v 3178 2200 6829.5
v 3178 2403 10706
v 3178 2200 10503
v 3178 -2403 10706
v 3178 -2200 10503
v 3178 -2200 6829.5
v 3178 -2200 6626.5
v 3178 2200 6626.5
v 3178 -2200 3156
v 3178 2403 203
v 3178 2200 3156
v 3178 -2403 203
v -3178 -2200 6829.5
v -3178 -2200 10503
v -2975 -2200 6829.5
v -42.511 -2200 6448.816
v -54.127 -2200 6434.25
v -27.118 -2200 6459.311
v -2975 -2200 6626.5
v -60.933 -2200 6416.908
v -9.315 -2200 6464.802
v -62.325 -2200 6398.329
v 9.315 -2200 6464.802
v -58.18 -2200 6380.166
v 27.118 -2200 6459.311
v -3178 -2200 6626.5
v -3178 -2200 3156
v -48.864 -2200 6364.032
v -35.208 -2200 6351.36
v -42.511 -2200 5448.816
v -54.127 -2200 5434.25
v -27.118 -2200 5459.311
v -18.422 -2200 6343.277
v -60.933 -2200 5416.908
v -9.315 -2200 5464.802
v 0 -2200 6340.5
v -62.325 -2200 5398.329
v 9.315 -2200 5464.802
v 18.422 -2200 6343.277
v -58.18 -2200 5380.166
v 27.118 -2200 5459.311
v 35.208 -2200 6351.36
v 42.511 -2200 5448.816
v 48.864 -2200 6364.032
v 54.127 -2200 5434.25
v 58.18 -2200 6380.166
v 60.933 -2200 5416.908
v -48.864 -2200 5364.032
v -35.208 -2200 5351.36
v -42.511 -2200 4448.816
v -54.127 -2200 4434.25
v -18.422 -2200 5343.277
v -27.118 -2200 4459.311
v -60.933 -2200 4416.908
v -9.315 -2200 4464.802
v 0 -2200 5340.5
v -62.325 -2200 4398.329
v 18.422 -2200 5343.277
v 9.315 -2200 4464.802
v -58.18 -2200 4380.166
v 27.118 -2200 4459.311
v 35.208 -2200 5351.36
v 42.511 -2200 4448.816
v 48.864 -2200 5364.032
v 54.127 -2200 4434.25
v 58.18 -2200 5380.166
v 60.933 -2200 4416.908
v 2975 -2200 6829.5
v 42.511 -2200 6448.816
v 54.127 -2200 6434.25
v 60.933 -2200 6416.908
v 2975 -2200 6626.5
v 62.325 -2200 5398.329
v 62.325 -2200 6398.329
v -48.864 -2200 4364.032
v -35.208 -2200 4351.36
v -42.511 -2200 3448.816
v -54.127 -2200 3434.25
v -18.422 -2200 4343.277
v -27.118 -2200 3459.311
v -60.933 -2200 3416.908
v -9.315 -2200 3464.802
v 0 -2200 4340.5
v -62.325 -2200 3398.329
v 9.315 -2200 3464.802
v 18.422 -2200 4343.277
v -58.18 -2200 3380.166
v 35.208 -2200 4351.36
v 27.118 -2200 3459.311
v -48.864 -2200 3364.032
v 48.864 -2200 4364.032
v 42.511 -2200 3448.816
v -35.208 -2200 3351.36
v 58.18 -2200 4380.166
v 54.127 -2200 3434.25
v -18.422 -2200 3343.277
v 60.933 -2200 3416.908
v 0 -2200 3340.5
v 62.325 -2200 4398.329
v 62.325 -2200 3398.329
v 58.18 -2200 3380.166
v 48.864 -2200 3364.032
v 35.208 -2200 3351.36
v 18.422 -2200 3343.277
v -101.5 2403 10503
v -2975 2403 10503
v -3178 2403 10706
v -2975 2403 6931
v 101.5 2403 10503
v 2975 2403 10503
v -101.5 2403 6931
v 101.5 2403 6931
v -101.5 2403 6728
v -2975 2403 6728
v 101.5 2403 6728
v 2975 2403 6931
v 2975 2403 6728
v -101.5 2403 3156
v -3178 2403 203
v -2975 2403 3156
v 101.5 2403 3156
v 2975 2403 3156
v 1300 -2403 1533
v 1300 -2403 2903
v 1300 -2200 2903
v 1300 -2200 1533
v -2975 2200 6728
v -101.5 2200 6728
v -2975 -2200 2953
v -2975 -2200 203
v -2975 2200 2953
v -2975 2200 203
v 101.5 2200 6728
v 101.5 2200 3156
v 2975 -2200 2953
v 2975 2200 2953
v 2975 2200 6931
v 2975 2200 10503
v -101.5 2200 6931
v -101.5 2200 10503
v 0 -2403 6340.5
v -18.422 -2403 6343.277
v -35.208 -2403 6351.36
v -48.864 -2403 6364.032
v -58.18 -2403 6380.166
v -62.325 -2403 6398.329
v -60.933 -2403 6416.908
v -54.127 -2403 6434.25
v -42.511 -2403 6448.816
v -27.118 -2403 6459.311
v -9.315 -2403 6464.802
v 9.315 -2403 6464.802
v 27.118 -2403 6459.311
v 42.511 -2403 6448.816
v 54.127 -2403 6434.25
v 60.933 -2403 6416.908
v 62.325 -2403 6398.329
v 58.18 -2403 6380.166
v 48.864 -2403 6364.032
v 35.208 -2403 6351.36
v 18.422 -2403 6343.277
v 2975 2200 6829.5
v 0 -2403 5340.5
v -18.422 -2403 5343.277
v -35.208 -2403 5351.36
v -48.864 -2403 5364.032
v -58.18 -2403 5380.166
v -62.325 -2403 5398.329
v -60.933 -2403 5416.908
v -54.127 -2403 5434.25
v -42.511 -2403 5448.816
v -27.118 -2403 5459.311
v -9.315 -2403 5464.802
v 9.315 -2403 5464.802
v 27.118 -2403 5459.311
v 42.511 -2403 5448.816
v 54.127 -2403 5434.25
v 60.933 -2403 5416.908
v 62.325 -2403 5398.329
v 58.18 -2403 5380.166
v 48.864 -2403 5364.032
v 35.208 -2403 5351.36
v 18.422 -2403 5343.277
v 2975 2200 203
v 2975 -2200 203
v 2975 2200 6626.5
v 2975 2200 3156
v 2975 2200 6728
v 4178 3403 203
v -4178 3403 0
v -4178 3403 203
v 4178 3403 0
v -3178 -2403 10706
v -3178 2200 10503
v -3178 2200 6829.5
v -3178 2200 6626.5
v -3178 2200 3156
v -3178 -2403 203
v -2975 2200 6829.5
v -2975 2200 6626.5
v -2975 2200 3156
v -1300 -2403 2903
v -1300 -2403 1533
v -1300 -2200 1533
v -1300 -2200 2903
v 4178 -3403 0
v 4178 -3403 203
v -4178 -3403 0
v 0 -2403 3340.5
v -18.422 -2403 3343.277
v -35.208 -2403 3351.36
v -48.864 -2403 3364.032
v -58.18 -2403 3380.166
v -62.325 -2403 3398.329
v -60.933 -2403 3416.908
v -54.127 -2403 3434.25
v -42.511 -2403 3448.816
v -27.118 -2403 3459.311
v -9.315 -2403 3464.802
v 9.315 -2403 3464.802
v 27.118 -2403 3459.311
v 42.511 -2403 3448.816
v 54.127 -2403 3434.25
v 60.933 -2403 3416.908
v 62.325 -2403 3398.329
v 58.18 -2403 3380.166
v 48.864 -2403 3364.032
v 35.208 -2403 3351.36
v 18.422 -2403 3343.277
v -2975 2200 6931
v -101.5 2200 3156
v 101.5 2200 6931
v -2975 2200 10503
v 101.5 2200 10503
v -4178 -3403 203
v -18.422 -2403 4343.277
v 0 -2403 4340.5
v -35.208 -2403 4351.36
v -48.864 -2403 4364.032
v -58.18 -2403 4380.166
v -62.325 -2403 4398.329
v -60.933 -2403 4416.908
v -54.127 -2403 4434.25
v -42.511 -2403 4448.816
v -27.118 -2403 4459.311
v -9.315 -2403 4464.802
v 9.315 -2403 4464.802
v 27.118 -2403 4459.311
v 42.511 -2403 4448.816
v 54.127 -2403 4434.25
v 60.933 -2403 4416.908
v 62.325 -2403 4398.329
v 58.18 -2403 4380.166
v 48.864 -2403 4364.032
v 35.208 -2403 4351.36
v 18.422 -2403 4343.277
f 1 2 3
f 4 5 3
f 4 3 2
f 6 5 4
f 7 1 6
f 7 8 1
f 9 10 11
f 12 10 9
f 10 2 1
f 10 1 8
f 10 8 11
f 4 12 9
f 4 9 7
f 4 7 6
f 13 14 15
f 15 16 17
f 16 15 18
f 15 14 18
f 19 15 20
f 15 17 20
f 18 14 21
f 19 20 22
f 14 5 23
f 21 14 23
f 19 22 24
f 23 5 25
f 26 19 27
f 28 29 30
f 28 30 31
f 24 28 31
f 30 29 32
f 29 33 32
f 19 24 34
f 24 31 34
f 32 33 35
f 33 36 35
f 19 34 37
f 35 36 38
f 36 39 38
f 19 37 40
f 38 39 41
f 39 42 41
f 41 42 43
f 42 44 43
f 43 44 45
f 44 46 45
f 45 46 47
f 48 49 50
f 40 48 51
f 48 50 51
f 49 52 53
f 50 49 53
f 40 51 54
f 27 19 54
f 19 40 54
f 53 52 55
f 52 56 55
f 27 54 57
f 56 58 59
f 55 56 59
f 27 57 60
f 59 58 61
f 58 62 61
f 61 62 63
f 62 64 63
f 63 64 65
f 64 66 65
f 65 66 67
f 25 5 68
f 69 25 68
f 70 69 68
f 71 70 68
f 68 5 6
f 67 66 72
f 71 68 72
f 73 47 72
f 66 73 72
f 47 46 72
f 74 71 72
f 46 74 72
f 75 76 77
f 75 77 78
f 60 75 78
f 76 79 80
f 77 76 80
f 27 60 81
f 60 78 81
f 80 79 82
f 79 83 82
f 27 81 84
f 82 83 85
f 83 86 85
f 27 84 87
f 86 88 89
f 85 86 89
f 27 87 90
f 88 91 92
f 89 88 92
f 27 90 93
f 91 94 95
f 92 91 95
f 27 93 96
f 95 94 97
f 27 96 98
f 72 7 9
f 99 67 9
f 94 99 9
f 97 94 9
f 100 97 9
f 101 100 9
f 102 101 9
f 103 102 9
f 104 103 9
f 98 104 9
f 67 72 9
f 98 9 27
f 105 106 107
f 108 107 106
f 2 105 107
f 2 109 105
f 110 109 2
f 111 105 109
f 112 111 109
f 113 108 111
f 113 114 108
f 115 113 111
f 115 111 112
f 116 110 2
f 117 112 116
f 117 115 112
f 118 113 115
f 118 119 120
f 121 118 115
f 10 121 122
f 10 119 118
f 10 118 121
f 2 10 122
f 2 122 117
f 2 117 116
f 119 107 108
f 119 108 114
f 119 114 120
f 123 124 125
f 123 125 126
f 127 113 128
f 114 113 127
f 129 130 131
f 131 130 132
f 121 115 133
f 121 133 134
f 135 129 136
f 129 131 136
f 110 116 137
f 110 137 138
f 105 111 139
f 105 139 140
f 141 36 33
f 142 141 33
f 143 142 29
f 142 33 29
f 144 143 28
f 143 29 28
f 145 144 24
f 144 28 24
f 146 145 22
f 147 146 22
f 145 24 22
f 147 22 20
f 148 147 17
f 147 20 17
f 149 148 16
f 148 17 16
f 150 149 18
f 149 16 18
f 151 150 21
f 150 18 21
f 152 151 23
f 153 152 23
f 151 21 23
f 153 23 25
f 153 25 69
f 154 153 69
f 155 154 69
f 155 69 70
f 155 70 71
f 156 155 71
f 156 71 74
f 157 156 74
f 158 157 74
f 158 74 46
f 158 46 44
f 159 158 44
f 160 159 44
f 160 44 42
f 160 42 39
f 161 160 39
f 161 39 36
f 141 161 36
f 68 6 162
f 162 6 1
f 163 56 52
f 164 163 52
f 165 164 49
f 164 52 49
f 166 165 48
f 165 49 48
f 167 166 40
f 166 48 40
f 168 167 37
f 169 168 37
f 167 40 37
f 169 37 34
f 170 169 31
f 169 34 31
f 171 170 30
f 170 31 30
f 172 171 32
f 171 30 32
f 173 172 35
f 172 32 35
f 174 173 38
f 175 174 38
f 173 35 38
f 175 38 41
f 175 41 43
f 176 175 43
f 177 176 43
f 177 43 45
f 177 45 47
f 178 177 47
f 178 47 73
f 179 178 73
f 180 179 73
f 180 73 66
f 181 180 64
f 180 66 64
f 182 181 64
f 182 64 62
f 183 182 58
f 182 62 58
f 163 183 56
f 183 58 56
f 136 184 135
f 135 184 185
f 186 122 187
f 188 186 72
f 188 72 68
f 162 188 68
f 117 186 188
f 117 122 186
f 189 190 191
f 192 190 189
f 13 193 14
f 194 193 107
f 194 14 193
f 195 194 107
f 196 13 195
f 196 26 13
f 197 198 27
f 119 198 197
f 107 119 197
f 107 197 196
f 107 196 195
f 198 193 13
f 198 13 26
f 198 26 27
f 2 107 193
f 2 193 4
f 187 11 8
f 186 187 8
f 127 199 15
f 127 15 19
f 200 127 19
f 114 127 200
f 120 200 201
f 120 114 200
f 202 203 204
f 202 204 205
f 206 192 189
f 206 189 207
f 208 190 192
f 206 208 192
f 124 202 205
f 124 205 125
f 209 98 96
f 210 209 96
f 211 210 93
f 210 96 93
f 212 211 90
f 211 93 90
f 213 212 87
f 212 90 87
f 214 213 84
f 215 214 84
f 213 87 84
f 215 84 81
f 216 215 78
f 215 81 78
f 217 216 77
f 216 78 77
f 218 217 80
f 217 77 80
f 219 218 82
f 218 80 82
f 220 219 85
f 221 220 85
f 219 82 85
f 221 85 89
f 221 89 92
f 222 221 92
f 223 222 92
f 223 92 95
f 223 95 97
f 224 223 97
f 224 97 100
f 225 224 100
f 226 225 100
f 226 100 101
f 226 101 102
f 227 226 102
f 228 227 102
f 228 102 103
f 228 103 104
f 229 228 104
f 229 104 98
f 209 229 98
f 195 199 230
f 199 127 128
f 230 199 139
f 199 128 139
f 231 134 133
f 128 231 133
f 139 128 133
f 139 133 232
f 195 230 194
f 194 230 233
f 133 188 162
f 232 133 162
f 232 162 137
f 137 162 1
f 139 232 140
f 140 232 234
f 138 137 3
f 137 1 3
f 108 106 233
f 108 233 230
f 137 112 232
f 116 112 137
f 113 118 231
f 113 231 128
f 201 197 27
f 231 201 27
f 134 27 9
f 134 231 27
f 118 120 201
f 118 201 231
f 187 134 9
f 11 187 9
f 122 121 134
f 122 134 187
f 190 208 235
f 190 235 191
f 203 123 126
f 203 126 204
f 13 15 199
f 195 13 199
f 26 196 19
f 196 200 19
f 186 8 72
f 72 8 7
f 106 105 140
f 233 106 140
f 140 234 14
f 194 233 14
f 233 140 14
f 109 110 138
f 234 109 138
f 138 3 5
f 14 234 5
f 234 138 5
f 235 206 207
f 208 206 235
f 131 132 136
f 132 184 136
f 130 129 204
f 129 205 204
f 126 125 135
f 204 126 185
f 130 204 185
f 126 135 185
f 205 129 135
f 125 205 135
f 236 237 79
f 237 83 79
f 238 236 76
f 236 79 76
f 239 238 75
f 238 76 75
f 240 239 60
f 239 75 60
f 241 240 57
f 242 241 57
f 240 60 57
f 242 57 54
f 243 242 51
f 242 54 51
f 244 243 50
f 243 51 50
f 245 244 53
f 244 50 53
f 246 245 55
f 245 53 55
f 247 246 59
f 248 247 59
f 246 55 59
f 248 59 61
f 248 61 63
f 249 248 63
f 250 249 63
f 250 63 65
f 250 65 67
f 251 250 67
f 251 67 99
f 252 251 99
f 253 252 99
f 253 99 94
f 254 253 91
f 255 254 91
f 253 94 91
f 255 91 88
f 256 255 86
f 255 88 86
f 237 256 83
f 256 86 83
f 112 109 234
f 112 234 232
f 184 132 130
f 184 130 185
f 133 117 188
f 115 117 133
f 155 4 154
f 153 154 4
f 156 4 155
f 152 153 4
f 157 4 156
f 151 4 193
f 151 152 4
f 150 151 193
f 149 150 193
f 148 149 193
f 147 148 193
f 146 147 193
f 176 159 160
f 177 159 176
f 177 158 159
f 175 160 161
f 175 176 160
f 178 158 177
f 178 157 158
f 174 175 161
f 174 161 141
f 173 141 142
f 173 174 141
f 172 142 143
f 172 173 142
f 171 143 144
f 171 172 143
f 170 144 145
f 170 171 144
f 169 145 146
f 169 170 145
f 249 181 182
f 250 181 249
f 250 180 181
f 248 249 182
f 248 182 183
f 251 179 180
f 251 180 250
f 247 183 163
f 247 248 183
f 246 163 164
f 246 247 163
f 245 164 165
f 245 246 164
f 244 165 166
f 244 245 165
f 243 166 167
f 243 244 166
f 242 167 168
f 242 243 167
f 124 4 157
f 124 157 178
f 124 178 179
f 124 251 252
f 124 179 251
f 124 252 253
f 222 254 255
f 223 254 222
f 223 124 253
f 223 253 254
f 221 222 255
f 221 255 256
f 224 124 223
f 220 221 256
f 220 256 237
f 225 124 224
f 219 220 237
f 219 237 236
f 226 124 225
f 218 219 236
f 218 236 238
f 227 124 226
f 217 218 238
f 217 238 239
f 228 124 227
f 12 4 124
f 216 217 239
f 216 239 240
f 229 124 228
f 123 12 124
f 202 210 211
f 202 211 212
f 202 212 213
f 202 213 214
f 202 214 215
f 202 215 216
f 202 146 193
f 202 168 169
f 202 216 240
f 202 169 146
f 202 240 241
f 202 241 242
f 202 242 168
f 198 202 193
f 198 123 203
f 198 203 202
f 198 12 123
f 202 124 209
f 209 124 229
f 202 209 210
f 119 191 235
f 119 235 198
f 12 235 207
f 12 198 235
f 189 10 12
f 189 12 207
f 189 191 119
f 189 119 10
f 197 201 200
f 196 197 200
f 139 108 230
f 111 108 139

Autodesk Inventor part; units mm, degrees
ref_plane "YZ Plane" through (0, 0, 0) normal (1, 0, 0) x (0, 1, 0)
ref_plane "XZ Plane" through (0, 0, 0) normal (0, 1, 0) x (-1, 0, 0)
ref_plane "XY Plane" through (0, 0, 0) normal (0, 0, 1) x (1, 0, 0)
sketch "Sketch1" plane through (0, 0, 0) normal (0, 0, 1) x (1, 0, 0)
  line L0 (-4178, 3403) -> (4178, 3403)
  line L1 (4178, 3403) -> (4178, -3403)
  line L2 (4178, -3403) -> (-4178, -3403)
  line L3 (-4178, -3403) -> (-4178, 3403)
  line L4 (-3178, 2403) -> (3178, 2403)
  line L5 (3178, 2403) -> (3178, -2403)
  line L6 (3178, -2403) -> (-3178, -2403)
  line L7 (-3178, -2403) -> (-3178, 2403)
  point P0 (0, 0)
  point P1 (4178, 0)
  point P2 (0, 3403)
  dimension "d0" = 8356
  dimension "d1" = 6806
  dimension "d2" = 1000
  dimension "d3" = 1000
  dimension "d4" = 1000
  dimension "d60" = 1000
extrude "Extrusion7" add sketch "Sketch1" along normal blind 10706 contours L4 L5 L6 L7
shell "Shell1" thickness 203 removed faces 1 at (-1059.3333, 801, 0)
extrude "Extrusion8" add sketch "Sketch1" along normal blind 203 contours L0 L1 L2 L3 | L4 L5 L6 L7
sketch "Sketch5" plane through (3178, -2403, 10706) normal (1, 0, 0) x (0, 0, -1)
  line L0 (10503, 0) -> (10503, 4806) projected
  line L1 (10503, 4806) -> (0, 4806) projected
  line L2 (0, 4806) -> (0, 0) projected
  line L3 (10503, 0) -> (0, 0) projected
  line L4 (203, 203) -> (3876.5, 203)
  line L5 (3876.5, 203) -> (3876.5, 4603)
  line L6 (3876.5, 4603) -> (203, 4603)
  line L7 (203, 4603) -> (203, 203)
  line L8 (4079.5, 203) -> (7753, 203)
  line L9 (7753, 203) -> (7753, 4603)
  line L10 (7753, 4603) -> (4079.5, 4603)
  line L11 (4079.5, 4603) -> (4079.5, 203)
  line L12 (7753, 203) -> (10503, 203)
  line L13 (10503, 203) -> (10503, 4603)
  line L14 (10503, 4603) -> (7753, 4603)
  line L15 (7753, 4603) -> (7753, 203)
  line L16 (203, 4603) -> (203, 203) projected
  point P0 (10706, 2403)
  dimension "d66" = 203
  dimension "d67" = 203
  dimension "d68" = 2750
  dimension "d70" = 10300
  dimension "d71" = 3673.5
  dimension "d72" = 3673.5
  dimension "d73" = 203
  dimension "d115" = 203
extrude "Extrusion9" cut sketch "Sketch5" against normal blind 6356 contours L8 L11 L10 L9 | L7 L6 L5 L4
sketch "Sketch6" plane through (-3178, 2403, 10706) normal (0, 1, 0) x (1, 0, 0)
  line L0 (6356, 10503) -> (0, 10503) projected
  line L1 (0, 10503) -> (0, 0) projected
  line L2 (6356, 10503) -> (6356, 0) projected
  line L3 (6153, 203) -> (3279.5, 203)
  line L4 (3279.5, 203) -> (3279.5, 3775)
  line L5 (3279.5, 3775) -> (6153, 3775)
  line L6 (6153, 3775) -> (6153, 203)
  line L7 (3076.5, 203) -> (203, 203)
  line L8 (203, 203) -> (203, 3775)
  line L9 (203, 3775) -> (3076.5, 3775)
  line L10 (3076.5, 3775) -> (3076.5, 203)
  line L11 (6153, 3978) -> (3279.5, 3978)
  line L12 (3279.5, 3978) -> (3279.5, 7550)
  line L13 (3279.5, 7550) -> (6153, 7550)
  line L14 (6153, 7550) -> (6153, 3978)
  line L15 (3076.5, 3978) -> (203, 3978)
  line L16 (203, 3978) -> (203, 7550)
  line L17 (203, 7550) -> (3076.5, 7550)
  line L18 (3076.5, 7550) -> (3076.5, 3978)
  line L19 (6153, 7550) -> (203, 7550)
  line L20 (203, 7550) -> (203, 10503)
  line L21 (203, 10503) -> (6153, 10503)
  line L22 (6153, 10503) -> (6153, 7550)
  line L23 (203, 10503) -> (6153, 10503) projected
  line L24 (6356, 203) -> (0, 203) projected
  line L25 (0, 0) -> (6356, 0) projected
  point P0 (3178, 10706)
  dimension "d77" = 203
  dimension "d78" = 203
  dimension "d79" = 2953
  dimension "d82" = 5950
  dimension "d83" = 2873.5
  dimension "d84" = 2873.5
  dimension "d85" = 203
  dimension "d86" = 7347
  dimension "d87" = 3572
  dimension "d88" = 3572
  dimension "d110" = 10300
  dimension "d111" = 203
  dimension "d112" = 203
extrude "Extrusion10" cut sketch "Sketch6" against normal blind 203 contours L14 L11 L12 L13 | L3 L4 L5 L6 | L17 L18 L15 L16 | L7 L8 L9 L10
sketch "Sketch7" plane through (-3178, -2403, 10706) normal (0, -1, 0) x (1, 0, 0)
  line L0 (0, -10503) -> (6356, -10503) projected
  line L1 (6356, -10503) -> (6356, 0) projected
  line L2 (0, -10503) -> (0, 0) projected
  line L3 (1878, -7803) -> (4478, -7803)
  line L4 (4478, -7803) -> (4478, -9173)
  line L5 (4478, -9173) -> (1878, -9173)
  line L6 (1878, -9173) -> (1878, -7803)
  line L7 (6153, -203) -> (6153, -3775) projected
  line L8 (203, -3775) -> (203, -203) projected
  point P0 (3178, -10706)
  point P1 (6153, -3775)
  point P2 (3178, -7303)
  point P3 (3178, -6303)
  point P4 (3178, -5303)
  point P5 (3178, -4303)
  dimension "d91" = 1370
  dimension "d92" = 2600
  dimension "d93" = 5950
  dimension "d94" = 1878
  dimension "d95" = 1878
  dimension "d96" = 2700
  dimension "d97" = 500
  dimension "d98" = 1000
  dimension "d99" = 1000
  dimension "d100" = 1000
hole "Hole2" at (0, -2403, 3403) at (0, -2403, 4403) at (0, -2403, 5403) at (0, -2403, 6403) direction (0, 1, 0) diameter 125 depth 203 tip angle 118
extrude "Extrusion11" cut sketch "Sketch7" against normal blind 203
extrude "Extrusion14" add sketch "Sketch1" along normal up to surface (203 mm away) from surface at 2953 contours L4 L5 L6 L7
properties part number "NRCC_Facade"
